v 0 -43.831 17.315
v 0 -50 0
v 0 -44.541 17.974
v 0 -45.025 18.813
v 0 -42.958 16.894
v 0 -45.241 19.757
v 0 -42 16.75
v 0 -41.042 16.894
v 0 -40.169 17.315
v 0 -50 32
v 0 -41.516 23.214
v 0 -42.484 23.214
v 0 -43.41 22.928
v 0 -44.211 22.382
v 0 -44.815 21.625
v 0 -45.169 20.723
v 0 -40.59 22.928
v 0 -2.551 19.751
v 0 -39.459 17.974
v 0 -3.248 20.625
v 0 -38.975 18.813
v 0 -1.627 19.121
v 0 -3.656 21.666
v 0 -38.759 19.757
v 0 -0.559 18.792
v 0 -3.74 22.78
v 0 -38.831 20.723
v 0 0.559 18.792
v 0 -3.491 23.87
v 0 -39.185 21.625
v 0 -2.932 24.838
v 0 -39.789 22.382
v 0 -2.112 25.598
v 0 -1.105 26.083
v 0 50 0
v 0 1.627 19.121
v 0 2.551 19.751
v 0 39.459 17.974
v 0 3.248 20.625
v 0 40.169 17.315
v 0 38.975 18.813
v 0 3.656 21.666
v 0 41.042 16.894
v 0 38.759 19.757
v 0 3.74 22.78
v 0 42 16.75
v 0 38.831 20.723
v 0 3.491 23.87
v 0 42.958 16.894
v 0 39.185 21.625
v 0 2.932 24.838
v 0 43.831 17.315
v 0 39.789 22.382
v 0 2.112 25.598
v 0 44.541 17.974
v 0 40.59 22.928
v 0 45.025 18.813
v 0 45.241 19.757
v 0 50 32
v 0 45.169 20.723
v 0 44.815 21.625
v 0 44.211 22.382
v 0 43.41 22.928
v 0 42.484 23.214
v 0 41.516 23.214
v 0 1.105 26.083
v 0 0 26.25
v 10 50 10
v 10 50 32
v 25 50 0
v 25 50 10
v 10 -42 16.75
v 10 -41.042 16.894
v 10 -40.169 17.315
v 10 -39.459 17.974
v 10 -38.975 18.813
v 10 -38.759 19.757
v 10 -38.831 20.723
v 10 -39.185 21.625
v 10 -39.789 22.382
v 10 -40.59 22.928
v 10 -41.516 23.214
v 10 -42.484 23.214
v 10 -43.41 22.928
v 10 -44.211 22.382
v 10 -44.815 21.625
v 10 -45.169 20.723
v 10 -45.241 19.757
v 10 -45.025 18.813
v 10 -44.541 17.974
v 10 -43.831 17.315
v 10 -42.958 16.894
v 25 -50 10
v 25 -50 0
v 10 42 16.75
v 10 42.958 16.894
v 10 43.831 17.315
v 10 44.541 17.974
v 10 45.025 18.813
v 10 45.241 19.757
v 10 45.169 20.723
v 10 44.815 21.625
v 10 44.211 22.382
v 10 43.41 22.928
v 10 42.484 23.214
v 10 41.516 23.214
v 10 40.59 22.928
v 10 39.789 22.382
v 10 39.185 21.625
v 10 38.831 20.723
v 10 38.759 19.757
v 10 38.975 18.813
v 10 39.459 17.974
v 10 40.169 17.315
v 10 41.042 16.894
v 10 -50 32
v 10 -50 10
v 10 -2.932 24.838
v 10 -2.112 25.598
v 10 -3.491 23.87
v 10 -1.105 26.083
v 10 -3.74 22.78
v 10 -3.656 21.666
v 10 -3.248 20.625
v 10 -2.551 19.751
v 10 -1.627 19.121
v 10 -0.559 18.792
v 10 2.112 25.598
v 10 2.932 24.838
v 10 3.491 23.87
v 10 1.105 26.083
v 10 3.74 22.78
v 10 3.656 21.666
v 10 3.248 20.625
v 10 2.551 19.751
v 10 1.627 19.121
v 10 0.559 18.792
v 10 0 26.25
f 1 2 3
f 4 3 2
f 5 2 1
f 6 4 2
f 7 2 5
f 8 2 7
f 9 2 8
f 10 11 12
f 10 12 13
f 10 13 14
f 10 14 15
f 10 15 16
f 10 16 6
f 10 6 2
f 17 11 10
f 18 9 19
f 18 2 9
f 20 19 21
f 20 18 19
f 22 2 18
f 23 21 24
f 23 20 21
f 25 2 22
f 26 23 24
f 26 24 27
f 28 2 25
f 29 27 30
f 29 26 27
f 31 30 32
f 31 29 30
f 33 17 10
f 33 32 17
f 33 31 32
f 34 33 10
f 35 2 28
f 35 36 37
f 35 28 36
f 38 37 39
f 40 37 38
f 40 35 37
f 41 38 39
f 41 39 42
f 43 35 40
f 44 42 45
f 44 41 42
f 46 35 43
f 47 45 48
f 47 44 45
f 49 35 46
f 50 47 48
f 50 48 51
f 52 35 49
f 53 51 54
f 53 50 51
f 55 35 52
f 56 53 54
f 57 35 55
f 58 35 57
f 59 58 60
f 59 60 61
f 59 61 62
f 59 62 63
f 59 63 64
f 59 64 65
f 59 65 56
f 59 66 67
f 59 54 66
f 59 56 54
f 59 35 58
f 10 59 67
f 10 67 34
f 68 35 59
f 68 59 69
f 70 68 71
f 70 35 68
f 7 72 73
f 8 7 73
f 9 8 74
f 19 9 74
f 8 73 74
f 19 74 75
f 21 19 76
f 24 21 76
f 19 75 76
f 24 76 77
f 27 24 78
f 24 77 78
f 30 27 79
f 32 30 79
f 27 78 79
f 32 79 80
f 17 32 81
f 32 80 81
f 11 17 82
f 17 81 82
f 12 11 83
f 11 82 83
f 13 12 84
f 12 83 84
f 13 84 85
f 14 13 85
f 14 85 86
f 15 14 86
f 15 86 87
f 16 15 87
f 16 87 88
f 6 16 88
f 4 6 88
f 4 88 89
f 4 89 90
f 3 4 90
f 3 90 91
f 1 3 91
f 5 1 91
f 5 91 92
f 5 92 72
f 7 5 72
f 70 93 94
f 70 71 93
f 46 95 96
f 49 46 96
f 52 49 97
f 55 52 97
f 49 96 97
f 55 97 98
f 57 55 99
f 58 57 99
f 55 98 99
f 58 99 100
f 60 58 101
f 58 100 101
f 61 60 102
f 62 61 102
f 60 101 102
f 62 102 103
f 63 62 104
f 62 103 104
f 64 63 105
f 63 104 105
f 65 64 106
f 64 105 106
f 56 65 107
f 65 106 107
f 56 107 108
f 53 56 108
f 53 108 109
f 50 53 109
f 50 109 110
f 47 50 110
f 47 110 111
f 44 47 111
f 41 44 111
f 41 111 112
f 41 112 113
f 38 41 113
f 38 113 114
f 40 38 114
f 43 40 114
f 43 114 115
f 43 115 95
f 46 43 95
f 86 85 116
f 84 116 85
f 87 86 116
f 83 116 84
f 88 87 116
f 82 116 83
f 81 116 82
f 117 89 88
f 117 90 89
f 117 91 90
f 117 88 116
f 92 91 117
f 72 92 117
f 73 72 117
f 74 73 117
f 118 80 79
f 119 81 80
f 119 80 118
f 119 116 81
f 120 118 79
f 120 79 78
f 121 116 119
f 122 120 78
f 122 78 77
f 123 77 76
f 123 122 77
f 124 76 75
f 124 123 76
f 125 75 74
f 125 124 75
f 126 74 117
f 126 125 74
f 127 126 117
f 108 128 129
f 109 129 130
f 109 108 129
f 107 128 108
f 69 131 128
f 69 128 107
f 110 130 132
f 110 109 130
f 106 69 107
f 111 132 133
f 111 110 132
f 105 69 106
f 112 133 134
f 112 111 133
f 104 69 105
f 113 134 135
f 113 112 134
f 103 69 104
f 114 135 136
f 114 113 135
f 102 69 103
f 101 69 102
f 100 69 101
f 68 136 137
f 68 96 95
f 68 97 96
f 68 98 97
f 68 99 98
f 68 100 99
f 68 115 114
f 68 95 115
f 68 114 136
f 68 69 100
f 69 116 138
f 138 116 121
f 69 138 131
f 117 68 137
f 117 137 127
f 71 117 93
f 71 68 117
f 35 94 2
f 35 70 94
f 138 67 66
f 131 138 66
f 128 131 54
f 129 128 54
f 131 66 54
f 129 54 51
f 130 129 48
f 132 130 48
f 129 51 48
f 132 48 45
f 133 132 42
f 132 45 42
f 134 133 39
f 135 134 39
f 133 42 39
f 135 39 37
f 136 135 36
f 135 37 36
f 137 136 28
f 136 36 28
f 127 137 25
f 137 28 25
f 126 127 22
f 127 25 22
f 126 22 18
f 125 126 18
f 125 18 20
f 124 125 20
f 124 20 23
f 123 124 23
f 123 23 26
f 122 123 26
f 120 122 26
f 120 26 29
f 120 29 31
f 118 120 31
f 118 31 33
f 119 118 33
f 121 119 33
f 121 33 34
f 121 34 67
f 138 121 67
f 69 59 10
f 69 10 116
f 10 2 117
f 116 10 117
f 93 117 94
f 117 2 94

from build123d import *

# Parameters (mm, degrees)
BOSS_EXTRUDE1_DEPTH        = 50
F_6_5_6_5_DIAMETER_HOLE1_D = 6.5
SKETCH4_R                  = 3.75
CUT_EXTRUDE1_DEPTH         = 65.412731661


with BuildPart() as part:
    # Sketch1 → Boss-Extrude1 (new, symmetric)
    with BuildSketch(Plane(origin=(0, 0, 0), x_dir=(1, 0, 0), z_dir=(0, 1, 0))):
        Polygon((25, 0), (0, 0), (0, -32), (10, -32), (10, -10), (25, -10), align=None)
    extrude(amount=BOSS_EXTRUDE1_DEPTH, both=True)

    # Ø6.5 (6.5) Diameter Hole1 (through all)
    with Locations(Plane.ZY):
        with Locations((20, -42), (20, 42)):
            Hole(F_6_5_6_5_DIAMETER_HOLE1_D / 2)

    # Sketch4 → Cut-Extrude1 (cut, through all)
    with BuildSketch(Plane.ZY):
        with Locations((22.5, 0)):
            Circle(SKETCH4_R)
    extrude(amount=-CUT_EXTRUDE1_DEPTH, mode=Mode.SUBTRACT)


solid = part.part
